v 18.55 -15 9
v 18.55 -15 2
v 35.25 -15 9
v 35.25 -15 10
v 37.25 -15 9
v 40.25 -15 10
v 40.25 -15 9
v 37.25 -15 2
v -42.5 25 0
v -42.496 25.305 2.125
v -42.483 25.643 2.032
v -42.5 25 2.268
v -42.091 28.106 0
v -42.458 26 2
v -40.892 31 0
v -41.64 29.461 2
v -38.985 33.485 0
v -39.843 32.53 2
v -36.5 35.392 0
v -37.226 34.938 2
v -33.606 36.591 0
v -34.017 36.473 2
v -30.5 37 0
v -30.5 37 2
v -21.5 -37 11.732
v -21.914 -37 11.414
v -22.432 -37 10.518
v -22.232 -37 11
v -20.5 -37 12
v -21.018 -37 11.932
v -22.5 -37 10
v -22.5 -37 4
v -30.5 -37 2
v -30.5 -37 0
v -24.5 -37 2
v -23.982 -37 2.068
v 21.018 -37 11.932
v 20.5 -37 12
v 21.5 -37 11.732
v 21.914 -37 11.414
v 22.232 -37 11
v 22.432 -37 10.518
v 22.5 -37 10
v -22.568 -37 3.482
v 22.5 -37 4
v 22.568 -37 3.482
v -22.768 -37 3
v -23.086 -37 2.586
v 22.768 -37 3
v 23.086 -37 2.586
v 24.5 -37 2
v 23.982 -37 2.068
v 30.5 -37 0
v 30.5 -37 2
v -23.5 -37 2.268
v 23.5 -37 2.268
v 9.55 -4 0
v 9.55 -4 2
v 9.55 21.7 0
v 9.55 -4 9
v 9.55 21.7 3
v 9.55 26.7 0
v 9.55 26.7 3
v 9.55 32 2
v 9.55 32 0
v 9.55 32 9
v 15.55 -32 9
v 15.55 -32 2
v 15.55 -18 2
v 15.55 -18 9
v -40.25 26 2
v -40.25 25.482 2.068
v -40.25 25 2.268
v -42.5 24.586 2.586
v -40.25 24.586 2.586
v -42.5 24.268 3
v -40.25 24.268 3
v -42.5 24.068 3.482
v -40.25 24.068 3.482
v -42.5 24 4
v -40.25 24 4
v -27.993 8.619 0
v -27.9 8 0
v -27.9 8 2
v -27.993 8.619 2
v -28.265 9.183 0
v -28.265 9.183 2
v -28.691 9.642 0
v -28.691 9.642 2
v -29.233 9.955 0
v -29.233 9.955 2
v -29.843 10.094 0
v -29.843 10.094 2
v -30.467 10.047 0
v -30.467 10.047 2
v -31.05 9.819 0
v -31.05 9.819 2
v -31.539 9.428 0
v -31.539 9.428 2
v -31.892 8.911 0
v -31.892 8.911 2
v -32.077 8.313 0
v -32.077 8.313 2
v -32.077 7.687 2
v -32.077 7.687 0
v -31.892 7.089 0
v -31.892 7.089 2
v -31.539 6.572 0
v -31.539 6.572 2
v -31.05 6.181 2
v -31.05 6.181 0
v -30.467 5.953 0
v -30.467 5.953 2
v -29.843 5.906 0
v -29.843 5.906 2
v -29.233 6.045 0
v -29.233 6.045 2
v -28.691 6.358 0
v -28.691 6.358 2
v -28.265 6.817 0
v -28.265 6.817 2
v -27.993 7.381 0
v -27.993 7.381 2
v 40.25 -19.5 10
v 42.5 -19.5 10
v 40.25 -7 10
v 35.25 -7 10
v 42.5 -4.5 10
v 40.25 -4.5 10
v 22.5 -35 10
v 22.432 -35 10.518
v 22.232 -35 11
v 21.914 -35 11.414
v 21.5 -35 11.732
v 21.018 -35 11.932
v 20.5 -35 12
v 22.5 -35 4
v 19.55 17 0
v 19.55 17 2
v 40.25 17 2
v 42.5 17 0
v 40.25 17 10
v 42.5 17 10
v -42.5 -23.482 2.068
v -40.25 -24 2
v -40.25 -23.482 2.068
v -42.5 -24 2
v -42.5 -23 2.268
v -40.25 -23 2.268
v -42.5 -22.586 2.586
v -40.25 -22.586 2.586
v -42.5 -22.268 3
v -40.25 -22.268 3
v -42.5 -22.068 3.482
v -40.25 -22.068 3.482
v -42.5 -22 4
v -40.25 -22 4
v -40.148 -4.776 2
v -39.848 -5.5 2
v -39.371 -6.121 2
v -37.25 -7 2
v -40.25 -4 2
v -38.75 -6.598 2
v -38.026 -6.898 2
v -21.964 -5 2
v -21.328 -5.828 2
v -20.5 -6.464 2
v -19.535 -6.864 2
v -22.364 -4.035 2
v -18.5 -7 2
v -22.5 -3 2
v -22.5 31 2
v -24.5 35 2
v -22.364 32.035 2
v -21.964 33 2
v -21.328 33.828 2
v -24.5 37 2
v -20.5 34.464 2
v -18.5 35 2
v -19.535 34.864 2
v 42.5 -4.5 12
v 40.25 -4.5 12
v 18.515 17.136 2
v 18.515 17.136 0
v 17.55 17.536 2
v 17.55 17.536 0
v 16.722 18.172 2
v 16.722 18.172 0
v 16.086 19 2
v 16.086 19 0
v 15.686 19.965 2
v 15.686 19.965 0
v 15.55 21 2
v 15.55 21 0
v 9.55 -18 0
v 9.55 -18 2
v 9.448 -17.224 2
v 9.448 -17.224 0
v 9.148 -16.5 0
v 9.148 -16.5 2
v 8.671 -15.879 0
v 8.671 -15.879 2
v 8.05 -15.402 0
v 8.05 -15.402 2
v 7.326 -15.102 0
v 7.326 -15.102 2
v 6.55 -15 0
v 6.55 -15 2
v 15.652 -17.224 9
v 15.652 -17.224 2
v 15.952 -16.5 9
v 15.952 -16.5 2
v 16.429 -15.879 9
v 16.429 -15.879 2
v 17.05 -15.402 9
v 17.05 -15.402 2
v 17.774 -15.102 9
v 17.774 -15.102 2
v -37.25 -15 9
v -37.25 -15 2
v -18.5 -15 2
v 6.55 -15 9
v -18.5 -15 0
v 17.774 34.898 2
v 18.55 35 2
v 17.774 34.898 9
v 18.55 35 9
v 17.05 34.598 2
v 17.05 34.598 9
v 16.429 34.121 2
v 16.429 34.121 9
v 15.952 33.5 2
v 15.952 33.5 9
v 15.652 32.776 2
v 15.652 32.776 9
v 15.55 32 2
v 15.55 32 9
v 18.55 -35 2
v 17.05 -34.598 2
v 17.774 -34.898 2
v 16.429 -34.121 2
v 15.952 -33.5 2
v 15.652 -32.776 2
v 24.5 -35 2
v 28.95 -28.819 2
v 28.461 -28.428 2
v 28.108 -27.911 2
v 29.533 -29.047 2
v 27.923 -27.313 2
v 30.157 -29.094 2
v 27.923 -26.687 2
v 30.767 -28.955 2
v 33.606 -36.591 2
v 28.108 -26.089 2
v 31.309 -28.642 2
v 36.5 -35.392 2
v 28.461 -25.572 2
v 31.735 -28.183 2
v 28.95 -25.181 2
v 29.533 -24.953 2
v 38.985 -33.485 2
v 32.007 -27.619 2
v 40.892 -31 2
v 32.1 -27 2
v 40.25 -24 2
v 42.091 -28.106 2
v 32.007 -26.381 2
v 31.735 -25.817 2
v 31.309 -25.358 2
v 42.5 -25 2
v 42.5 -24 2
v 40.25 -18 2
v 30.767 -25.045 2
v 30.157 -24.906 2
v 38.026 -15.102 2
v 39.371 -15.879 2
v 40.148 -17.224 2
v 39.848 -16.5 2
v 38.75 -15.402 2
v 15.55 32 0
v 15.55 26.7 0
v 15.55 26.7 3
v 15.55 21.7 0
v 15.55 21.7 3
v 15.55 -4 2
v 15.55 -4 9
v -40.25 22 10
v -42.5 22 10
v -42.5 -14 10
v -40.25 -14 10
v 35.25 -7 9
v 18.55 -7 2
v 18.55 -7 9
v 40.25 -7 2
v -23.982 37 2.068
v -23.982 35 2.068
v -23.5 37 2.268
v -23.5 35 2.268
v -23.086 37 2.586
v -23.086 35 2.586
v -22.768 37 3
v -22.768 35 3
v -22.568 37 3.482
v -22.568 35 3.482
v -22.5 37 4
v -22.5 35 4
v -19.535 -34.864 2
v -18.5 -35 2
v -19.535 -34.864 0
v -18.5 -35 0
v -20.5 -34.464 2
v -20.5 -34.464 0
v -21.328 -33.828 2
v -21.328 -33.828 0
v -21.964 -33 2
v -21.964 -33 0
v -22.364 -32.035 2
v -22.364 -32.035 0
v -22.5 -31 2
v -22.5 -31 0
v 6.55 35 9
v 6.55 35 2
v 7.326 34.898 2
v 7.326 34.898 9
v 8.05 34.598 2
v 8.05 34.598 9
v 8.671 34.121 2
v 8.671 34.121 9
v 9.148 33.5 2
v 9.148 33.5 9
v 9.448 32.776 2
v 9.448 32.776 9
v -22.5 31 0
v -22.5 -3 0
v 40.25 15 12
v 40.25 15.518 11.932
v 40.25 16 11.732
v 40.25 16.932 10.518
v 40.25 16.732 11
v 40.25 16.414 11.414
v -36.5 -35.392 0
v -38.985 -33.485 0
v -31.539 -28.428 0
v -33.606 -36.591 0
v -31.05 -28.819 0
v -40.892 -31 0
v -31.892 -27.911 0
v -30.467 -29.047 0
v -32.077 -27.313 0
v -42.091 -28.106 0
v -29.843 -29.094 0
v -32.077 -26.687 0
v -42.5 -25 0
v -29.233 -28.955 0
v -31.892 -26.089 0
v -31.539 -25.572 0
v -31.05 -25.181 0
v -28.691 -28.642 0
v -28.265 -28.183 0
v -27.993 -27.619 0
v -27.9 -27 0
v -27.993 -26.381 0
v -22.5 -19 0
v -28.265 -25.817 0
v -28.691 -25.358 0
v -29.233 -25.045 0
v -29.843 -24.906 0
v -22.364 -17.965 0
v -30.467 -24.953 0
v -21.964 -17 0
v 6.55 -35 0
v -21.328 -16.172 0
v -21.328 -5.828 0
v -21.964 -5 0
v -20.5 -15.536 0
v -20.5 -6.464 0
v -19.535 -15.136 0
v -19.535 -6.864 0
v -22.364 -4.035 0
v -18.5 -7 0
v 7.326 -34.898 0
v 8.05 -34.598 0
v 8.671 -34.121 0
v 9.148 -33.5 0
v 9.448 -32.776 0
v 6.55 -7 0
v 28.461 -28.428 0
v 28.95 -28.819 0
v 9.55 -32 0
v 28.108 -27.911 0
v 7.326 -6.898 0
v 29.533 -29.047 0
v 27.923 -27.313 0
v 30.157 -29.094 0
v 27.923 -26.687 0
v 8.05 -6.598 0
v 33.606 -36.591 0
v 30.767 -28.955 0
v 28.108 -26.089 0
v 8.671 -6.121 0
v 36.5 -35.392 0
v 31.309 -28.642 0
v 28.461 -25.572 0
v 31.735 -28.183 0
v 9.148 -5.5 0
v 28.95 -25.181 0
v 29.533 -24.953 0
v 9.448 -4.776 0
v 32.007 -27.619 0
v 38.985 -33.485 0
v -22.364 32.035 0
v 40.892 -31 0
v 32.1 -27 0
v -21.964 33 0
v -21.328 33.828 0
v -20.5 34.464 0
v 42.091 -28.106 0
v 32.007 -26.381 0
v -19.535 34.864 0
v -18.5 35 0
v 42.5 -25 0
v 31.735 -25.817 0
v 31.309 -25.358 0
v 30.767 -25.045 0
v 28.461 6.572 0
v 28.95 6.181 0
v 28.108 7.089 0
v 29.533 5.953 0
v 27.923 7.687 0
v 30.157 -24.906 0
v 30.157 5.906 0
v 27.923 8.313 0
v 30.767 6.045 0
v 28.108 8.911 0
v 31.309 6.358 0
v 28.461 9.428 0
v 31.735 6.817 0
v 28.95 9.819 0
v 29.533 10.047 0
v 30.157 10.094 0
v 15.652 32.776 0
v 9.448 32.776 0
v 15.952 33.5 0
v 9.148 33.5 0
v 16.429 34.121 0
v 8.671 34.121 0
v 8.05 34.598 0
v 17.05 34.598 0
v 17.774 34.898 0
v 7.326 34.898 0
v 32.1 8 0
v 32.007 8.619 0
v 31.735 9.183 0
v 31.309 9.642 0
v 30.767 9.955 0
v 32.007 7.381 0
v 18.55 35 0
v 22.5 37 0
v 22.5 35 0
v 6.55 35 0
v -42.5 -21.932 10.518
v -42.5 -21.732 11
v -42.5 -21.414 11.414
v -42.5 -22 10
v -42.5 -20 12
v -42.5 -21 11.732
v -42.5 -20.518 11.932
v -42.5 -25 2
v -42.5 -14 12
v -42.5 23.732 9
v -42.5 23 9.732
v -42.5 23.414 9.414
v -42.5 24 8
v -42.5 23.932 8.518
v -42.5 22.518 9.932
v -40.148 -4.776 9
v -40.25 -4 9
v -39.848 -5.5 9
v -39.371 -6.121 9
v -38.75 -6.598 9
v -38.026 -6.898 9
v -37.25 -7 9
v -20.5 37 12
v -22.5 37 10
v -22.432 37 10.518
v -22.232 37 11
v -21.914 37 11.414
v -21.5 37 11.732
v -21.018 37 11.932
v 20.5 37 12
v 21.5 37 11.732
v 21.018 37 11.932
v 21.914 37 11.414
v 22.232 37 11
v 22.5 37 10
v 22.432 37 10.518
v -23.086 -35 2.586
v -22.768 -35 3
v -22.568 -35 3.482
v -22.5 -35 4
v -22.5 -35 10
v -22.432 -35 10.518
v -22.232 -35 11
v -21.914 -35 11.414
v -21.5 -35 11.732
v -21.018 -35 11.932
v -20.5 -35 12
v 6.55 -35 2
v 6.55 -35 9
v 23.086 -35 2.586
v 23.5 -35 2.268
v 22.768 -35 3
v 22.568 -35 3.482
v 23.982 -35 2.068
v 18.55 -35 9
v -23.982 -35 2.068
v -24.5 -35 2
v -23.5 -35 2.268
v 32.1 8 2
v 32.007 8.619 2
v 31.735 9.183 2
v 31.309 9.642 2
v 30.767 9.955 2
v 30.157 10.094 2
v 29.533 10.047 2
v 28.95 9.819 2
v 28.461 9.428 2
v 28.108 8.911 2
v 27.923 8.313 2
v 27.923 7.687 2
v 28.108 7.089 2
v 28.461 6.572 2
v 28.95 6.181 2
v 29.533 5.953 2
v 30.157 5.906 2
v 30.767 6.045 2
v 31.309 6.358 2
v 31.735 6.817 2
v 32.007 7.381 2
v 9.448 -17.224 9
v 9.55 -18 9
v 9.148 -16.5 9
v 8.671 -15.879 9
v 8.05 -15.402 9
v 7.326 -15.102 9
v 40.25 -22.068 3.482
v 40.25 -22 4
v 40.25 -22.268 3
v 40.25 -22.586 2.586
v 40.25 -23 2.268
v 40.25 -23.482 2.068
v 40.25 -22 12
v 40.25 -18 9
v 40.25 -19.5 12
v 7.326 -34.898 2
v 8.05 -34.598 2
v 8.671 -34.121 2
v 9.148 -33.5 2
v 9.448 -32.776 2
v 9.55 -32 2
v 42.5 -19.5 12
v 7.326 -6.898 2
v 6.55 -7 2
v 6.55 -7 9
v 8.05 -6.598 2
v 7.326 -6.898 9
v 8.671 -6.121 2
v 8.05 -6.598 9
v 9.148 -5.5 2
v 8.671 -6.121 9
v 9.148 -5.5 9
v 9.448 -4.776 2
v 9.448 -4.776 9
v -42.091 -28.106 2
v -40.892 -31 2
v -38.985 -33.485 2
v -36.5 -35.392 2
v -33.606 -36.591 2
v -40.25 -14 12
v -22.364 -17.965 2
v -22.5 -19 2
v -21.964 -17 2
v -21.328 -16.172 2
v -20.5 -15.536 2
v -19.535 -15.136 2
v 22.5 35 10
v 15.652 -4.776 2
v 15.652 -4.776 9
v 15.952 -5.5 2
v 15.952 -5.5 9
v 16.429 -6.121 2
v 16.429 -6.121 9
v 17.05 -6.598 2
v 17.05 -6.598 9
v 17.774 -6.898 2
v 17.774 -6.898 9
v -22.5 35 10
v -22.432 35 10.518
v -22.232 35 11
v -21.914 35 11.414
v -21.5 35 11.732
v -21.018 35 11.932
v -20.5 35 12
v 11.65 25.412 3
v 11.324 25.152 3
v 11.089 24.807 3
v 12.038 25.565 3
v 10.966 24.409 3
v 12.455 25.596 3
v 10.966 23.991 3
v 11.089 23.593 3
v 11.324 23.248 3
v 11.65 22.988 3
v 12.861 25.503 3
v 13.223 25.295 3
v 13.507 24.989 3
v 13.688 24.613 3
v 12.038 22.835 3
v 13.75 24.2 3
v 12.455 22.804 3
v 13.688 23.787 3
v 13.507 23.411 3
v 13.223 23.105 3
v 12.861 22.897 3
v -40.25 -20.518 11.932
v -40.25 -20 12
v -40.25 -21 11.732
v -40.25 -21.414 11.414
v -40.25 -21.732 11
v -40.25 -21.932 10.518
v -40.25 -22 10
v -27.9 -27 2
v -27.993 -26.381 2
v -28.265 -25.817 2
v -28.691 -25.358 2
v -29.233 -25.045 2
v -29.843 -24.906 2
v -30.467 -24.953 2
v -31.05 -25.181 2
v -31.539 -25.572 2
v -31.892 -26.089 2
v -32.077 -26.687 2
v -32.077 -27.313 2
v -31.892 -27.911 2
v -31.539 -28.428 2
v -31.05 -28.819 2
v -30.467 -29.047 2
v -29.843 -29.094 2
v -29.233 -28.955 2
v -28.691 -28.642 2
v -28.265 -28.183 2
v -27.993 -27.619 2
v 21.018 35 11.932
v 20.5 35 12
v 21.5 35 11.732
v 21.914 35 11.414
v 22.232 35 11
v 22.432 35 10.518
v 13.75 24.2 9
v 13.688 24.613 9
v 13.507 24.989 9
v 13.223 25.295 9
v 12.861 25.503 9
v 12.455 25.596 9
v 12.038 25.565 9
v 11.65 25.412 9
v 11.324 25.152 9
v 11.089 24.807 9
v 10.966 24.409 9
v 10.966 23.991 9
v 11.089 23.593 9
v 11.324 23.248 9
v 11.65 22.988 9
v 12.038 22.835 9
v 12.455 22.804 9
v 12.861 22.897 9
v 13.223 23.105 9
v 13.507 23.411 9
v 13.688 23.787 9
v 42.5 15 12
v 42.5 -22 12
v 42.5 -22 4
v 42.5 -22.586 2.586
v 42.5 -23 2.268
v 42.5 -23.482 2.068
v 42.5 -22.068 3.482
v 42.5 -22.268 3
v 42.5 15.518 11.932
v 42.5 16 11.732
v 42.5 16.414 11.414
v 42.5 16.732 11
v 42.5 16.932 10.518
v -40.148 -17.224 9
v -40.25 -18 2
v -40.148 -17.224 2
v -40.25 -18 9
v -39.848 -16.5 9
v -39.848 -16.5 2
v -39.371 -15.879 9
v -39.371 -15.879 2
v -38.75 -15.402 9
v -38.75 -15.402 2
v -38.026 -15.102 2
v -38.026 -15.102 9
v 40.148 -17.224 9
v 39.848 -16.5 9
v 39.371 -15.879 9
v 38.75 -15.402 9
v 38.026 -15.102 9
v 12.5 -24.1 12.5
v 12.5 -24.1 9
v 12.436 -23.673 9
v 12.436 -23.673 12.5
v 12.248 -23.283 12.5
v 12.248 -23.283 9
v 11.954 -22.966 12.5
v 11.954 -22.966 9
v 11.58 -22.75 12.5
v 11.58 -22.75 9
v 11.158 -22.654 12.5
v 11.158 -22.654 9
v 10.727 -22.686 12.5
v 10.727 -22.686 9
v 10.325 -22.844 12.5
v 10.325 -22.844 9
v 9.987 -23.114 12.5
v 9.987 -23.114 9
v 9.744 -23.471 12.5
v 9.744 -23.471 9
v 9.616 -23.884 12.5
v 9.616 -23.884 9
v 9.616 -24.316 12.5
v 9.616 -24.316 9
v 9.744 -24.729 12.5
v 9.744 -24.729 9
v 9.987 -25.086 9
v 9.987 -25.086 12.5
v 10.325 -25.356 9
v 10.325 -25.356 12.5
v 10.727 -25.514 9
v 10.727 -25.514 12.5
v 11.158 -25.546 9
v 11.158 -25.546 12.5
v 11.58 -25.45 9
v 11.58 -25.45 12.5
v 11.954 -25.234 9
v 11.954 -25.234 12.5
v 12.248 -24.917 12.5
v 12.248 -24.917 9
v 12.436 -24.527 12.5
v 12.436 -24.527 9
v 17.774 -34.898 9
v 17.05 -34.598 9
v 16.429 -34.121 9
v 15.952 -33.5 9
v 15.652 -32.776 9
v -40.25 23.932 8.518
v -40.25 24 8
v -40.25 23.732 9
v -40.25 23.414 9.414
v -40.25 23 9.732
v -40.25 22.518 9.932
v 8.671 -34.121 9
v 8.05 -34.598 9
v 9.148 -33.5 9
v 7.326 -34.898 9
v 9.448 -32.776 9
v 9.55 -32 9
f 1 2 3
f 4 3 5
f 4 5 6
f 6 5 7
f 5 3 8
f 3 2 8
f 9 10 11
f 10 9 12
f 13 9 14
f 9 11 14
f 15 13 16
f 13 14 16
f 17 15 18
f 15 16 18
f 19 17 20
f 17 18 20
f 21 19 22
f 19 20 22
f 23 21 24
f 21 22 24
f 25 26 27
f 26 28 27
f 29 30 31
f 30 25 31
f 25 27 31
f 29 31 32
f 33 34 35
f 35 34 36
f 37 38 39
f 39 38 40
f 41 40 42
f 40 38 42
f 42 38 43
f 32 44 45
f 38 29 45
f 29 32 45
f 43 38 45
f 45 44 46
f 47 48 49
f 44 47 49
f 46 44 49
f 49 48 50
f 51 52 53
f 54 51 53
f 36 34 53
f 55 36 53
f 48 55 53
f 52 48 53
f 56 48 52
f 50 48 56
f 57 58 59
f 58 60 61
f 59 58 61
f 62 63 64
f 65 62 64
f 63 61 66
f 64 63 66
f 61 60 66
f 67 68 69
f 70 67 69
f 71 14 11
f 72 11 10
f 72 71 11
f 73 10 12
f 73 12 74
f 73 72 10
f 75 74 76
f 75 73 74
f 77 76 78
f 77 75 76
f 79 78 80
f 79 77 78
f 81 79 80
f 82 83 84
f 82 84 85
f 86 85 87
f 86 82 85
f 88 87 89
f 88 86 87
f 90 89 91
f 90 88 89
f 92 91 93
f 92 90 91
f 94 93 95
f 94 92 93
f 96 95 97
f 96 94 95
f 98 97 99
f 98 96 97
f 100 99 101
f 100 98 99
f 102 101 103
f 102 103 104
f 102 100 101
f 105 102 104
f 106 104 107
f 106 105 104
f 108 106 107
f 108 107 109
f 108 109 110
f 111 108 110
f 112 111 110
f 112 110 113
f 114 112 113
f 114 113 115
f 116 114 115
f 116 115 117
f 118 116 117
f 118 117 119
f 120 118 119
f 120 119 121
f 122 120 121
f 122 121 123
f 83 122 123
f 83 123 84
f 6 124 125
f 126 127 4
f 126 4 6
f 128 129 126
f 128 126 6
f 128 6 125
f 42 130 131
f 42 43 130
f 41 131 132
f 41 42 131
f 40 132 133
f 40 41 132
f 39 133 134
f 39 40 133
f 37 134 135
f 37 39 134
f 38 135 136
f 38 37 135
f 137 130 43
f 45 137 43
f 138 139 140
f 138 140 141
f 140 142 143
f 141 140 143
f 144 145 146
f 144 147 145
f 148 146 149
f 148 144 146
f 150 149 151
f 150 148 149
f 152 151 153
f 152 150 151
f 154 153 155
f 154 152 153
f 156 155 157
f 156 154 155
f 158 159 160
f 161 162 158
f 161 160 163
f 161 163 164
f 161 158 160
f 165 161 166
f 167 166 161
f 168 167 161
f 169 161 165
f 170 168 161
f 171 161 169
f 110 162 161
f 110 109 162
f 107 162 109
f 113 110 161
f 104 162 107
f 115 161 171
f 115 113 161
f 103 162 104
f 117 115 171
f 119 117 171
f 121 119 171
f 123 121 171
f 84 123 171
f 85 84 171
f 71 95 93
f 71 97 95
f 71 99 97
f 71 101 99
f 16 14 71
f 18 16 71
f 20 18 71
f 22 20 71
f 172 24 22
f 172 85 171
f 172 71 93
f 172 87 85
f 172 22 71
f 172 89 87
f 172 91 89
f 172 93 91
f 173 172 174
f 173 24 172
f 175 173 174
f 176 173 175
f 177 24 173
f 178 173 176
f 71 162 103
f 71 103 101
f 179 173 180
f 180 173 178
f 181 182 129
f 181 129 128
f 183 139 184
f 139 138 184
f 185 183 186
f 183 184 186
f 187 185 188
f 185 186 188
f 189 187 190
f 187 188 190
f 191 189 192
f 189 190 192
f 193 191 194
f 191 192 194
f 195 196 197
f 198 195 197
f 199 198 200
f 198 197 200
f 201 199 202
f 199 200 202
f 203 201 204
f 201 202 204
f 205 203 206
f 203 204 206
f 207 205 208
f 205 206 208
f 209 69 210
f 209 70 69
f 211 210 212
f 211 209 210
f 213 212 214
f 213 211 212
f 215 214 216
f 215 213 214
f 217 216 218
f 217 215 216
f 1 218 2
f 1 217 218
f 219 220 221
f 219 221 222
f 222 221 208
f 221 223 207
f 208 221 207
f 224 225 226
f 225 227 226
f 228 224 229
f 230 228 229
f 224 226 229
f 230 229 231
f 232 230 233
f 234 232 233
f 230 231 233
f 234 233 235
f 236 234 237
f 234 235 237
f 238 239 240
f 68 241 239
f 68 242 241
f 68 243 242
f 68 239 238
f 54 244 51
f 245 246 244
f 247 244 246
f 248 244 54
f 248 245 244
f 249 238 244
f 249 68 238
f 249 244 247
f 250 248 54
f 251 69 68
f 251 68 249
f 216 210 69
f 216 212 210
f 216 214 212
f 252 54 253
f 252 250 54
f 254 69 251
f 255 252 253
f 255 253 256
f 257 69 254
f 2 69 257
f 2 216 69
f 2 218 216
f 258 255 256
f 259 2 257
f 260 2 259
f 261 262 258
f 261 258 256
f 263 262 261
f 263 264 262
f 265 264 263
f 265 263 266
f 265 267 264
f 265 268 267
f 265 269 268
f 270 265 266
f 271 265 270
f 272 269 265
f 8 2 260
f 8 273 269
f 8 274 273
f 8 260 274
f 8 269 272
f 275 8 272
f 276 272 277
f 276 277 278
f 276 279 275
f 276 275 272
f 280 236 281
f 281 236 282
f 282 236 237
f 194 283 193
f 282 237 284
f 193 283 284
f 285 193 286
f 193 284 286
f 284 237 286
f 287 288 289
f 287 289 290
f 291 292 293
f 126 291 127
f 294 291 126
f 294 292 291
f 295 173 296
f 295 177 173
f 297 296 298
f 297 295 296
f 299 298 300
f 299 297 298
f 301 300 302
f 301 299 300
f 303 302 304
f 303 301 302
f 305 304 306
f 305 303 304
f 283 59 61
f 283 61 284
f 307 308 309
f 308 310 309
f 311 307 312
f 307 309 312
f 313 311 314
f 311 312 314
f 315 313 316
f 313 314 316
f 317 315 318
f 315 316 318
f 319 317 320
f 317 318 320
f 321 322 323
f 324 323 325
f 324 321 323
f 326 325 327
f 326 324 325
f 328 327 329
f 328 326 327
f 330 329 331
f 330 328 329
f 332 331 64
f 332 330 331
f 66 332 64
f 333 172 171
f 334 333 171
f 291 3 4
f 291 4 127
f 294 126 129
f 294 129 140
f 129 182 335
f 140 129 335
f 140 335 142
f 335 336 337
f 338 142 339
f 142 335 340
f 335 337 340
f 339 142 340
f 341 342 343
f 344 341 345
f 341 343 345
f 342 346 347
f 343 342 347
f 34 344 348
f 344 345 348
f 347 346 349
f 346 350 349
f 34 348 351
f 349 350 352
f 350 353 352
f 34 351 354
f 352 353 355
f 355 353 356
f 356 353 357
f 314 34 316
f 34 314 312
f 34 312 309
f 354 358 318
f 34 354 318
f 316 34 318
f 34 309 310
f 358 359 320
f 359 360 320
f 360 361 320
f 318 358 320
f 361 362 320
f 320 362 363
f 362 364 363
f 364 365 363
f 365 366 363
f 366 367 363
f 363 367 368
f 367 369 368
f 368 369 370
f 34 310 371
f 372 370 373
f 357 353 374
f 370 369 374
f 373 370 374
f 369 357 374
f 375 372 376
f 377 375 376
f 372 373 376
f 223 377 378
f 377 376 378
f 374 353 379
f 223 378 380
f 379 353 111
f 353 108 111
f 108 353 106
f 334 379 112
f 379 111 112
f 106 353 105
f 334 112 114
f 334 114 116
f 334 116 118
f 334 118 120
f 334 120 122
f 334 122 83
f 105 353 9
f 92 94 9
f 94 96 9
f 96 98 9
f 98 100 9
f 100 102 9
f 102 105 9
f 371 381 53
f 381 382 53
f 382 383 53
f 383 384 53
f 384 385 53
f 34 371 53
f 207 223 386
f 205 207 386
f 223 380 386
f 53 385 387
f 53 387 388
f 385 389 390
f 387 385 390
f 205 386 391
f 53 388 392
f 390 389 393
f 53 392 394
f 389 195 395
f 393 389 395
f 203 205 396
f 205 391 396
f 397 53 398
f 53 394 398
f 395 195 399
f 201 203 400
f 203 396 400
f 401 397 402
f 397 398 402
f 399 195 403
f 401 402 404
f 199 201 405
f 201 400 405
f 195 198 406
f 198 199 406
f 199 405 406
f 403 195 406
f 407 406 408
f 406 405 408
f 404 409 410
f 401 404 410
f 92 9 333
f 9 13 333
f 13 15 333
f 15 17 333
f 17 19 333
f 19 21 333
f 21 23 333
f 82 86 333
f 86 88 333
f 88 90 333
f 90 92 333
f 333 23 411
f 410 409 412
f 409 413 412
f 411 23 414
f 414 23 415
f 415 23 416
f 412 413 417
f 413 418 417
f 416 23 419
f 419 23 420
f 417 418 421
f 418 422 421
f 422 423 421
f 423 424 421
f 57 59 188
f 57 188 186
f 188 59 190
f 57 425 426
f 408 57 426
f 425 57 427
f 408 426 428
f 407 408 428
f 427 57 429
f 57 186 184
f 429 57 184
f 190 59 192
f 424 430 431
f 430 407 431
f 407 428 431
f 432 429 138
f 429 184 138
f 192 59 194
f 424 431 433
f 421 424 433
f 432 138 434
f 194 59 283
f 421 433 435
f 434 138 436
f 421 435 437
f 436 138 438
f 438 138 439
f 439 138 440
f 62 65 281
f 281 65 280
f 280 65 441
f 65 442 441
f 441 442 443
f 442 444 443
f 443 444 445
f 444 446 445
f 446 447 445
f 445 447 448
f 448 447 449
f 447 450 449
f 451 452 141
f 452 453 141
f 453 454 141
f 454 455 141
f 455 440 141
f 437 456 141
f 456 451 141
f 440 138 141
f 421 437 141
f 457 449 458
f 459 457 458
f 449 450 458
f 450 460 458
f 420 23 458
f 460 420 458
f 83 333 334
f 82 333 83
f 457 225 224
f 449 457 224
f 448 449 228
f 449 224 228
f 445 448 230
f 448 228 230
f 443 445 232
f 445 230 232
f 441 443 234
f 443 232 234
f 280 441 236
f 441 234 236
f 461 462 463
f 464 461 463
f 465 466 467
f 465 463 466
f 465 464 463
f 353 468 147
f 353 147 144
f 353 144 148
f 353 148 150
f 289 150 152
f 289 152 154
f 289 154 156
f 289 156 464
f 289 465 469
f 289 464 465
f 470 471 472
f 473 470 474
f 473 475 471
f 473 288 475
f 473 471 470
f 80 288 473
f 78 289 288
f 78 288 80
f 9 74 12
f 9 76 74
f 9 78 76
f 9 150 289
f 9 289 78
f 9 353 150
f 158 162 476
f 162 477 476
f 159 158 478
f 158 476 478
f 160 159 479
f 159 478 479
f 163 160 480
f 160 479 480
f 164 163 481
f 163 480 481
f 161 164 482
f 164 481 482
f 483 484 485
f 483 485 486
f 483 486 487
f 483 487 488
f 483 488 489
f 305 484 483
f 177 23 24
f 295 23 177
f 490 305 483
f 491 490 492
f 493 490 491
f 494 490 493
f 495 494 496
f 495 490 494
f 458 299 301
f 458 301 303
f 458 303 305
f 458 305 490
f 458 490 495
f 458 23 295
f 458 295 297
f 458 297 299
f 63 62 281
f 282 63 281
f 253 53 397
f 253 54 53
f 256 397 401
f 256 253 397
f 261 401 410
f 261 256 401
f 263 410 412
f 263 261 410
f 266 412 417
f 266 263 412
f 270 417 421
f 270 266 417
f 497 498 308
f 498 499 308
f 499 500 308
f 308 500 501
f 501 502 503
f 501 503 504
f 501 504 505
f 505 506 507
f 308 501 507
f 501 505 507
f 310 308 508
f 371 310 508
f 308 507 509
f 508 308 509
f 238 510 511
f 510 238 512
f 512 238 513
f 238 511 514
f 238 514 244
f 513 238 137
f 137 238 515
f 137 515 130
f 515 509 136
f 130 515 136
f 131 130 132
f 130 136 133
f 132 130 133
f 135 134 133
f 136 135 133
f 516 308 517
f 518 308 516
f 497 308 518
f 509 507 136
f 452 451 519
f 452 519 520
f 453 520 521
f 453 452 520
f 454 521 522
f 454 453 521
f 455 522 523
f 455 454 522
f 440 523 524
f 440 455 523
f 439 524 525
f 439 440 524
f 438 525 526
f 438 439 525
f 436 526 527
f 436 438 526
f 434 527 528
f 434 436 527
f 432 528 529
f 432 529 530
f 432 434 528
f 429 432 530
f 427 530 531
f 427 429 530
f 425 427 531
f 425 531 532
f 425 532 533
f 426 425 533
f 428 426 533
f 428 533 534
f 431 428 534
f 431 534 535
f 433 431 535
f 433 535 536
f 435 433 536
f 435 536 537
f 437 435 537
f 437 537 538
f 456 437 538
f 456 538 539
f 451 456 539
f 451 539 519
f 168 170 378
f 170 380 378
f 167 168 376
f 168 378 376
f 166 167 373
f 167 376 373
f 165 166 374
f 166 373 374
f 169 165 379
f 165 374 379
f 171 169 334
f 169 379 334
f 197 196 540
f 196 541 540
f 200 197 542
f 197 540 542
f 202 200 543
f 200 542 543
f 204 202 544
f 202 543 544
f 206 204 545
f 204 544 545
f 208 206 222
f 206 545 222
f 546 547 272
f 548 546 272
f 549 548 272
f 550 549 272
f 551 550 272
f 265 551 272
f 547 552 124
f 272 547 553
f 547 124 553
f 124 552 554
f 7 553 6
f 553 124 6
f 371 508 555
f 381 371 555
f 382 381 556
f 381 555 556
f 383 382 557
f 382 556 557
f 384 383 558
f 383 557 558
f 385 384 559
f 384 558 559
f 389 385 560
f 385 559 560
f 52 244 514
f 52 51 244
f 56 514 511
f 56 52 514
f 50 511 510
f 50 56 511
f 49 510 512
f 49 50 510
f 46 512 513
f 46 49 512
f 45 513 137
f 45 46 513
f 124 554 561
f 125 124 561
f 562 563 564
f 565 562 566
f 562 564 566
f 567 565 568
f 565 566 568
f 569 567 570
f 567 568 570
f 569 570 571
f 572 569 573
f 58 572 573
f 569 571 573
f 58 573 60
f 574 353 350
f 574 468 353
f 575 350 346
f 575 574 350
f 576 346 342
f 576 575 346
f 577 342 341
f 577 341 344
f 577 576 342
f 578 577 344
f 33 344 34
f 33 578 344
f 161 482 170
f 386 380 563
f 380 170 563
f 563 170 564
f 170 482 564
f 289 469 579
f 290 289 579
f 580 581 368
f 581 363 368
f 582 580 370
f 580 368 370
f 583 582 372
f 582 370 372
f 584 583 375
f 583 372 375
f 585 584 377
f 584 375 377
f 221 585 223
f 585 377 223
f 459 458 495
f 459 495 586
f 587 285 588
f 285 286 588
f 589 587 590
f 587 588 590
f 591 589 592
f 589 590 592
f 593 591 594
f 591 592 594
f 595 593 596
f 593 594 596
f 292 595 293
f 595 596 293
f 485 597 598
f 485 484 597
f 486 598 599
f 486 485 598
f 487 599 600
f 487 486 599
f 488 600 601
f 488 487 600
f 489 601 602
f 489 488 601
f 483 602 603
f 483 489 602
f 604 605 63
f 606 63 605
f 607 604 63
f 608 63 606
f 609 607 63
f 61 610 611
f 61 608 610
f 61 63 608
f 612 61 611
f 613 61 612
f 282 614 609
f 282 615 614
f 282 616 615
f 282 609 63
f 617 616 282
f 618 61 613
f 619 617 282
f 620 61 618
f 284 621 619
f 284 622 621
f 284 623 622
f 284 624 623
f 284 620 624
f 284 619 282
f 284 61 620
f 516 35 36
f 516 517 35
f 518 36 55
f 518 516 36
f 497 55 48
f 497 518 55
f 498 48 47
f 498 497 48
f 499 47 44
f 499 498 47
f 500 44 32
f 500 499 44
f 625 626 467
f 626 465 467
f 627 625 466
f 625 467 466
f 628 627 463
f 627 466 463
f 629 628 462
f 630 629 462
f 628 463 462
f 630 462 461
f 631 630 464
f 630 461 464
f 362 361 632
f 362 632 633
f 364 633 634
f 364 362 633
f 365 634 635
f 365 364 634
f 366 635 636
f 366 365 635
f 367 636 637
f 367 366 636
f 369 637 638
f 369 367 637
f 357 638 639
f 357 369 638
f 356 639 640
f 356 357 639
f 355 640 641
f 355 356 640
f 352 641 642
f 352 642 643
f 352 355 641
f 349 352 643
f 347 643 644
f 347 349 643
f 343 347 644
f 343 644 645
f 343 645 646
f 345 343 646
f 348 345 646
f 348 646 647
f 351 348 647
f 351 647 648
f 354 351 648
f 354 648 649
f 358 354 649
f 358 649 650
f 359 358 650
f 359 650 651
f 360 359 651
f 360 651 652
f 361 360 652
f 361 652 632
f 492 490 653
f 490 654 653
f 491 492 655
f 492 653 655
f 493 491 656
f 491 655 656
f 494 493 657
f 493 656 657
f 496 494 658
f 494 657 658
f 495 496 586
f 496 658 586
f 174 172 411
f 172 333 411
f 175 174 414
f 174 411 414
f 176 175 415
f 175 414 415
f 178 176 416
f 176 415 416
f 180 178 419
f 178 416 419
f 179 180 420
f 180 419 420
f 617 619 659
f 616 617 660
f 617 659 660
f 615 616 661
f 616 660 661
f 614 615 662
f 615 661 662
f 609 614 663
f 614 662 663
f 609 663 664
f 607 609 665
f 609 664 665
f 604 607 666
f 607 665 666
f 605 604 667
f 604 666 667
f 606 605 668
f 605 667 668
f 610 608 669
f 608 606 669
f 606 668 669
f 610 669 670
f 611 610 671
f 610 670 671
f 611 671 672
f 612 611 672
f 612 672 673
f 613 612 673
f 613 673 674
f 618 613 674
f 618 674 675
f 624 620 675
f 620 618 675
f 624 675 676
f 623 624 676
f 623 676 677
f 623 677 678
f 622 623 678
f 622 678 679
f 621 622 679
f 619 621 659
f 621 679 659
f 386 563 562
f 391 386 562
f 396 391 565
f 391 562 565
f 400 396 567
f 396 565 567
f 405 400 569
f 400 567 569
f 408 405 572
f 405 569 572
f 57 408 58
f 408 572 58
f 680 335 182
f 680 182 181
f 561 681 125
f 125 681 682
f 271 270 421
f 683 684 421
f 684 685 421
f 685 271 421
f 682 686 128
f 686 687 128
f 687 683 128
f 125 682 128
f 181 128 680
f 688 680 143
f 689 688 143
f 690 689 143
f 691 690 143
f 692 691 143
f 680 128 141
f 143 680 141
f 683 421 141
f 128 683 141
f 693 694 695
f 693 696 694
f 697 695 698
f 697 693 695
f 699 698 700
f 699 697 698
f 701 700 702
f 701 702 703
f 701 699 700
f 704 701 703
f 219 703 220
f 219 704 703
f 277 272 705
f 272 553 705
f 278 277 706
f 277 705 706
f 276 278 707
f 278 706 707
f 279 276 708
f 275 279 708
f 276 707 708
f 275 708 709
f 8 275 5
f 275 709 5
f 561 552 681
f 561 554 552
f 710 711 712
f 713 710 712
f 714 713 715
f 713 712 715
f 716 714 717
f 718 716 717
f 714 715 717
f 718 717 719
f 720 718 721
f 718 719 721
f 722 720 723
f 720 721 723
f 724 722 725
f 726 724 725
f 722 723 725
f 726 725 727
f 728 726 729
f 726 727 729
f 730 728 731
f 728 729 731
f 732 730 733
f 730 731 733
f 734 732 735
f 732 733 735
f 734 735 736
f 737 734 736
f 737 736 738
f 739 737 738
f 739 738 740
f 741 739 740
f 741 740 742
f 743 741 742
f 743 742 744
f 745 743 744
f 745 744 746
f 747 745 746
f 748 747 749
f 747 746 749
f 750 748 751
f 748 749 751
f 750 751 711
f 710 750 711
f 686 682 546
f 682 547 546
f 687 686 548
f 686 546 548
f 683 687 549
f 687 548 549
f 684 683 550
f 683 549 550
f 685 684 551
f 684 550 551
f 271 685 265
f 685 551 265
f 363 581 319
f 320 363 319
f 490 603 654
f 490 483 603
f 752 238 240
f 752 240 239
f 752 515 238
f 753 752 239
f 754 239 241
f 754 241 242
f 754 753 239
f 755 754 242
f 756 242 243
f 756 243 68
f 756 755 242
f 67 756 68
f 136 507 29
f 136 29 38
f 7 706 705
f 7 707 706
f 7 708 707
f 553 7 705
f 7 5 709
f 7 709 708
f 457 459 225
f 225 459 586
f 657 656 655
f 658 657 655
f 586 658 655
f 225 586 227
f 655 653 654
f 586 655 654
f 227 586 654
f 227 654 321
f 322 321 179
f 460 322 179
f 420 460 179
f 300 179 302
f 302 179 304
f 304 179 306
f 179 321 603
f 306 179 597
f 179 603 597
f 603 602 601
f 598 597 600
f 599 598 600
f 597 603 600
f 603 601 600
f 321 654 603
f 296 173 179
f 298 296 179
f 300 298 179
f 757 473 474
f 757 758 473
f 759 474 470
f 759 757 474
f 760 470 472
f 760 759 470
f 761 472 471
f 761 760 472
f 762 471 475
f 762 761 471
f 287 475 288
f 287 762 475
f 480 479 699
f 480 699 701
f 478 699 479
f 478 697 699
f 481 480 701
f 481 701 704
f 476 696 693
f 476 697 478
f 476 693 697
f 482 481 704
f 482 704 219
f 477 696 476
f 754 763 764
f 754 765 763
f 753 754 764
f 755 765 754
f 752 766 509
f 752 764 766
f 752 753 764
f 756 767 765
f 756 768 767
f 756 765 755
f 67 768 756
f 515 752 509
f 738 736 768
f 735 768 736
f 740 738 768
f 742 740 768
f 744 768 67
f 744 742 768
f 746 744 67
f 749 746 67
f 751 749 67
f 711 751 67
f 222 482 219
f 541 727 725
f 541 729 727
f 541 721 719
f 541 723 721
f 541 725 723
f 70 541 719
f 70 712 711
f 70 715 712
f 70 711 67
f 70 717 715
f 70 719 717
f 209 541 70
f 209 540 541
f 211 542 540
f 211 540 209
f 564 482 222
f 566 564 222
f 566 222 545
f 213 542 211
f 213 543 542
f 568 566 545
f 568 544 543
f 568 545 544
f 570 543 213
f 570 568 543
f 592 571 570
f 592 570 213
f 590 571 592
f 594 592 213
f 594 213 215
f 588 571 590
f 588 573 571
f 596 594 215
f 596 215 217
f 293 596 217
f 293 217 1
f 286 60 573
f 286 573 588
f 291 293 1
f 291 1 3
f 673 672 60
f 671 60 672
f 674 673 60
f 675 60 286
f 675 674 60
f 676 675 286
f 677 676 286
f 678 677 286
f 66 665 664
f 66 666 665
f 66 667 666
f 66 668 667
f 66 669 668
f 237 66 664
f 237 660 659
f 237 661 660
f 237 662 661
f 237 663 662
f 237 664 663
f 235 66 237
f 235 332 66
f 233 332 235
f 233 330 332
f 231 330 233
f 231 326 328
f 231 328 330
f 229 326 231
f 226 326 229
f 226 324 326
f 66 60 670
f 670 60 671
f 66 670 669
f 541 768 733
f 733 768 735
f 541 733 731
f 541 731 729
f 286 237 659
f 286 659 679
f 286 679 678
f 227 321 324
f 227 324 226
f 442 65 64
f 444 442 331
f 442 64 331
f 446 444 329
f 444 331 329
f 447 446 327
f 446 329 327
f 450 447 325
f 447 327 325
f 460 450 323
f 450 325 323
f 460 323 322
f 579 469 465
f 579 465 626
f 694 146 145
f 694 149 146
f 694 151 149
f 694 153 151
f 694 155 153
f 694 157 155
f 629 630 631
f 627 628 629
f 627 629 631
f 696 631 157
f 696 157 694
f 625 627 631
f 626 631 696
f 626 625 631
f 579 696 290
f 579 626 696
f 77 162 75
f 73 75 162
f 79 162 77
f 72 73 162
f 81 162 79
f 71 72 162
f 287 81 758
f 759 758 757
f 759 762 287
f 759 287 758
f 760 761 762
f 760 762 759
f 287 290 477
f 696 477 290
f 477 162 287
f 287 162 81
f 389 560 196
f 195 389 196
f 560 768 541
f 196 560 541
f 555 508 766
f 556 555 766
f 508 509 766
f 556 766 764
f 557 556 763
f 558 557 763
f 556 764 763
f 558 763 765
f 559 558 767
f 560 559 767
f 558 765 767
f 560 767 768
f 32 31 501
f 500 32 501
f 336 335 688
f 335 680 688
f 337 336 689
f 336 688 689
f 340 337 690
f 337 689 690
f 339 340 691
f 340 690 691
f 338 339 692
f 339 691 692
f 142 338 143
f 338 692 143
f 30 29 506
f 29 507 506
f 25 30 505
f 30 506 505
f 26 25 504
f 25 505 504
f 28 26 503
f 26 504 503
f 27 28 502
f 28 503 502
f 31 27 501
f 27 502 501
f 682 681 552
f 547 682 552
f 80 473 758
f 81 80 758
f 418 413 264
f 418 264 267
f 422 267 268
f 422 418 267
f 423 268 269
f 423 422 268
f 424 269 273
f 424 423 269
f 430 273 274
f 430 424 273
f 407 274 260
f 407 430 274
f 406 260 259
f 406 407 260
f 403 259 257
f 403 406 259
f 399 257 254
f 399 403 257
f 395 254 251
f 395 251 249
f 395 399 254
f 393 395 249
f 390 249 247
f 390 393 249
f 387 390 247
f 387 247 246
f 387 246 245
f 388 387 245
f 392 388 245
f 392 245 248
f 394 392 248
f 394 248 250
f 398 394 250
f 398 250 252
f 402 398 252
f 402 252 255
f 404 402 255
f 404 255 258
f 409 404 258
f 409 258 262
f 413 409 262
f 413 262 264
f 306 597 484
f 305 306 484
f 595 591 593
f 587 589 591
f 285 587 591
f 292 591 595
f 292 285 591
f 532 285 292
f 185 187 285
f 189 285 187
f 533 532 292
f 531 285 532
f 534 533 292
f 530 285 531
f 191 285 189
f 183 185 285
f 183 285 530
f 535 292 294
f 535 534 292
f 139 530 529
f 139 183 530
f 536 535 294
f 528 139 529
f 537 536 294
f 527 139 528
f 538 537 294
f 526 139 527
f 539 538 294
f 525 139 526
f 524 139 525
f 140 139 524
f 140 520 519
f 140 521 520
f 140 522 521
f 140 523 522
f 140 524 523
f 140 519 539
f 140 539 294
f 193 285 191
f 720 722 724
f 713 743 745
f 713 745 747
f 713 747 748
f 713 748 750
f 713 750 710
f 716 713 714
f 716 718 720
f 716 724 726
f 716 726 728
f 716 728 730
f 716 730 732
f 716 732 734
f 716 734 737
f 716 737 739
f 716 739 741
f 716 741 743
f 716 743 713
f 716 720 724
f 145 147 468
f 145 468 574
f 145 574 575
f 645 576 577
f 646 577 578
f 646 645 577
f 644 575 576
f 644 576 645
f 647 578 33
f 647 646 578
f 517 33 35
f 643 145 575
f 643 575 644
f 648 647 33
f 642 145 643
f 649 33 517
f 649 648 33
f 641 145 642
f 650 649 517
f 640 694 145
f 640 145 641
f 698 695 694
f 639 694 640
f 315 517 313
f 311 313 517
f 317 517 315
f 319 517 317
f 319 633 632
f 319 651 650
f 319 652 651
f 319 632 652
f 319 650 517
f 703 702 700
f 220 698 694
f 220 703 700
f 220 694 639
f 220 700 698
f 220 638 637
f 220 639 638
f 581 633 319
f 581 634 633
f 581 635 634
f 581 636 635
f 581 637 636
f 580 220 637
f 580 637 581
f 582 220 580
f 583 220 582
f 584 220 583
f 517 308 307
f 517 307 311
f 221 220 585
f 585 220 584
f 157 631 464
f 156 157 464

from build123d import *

# Parameters (mm, degrees)
F0_W      = 85
F0_H      = 74
F0_R      = 2.1
F1_DEPTH  = 12
F2_W      = 80.5
F2_H      = 70
F2_R      = 2.1
F3_DEPTH  = 10
F4_W      = 6
F4_H      = 42
F4_W_2    = 49.8
F4_H_2    = 8
F4_W_3    = 24.7
F4_H_3    = 20
F5_DEPTH  = 7
F6_R      = 1.45
F7_DEPTH  = 3.5
F8_W      = 2.25
F8_H      = 38
F9_DEPTH  = 2
F11_DEPTH = 10
F12_W     = 2.25
F12_H     = 15
F13_DEPTH = 2
F14_R     = 12
F15_R     = 3
F17_DEPTH = 2
F19_DEPTH = 2
F21_DEPTH = 2
F22_R     = 4
F23_R     = 2
F6_R_2    = 1.4
F24_DEPTH = 9
F25_W     = 6
F25_H     = 5
F25_R     = 1.4
F26_DEPTH = 3
F27_W     = 5
F27_H     = 8
F28_DEPTH = 1


with BuildPart() as f1:
    # F0 (on Top) → F1 (new body)
    with BuildSketch(Plane.XY):
        Rectangle(F0_W, F0_H)
        with Locations((-30, -27)):
            Circle(F0_R, mode=Mode.SUBTRACT)
        with Locations((30, -27)):
            Circle(F0_R, mode=Mode.SUBTRACT)
        with Locations((-30, 8)):
            Circle(F0_R, mode=Mode.SUBTRACT)
        with Locations((30, 8)):
            Circle(F0_R, mode=Mode.SUBTRACT)
    extrude(amount=F1_DEPTH)

    # F2 (on face) → F3 (cut)
    with BuildSketch(Plane.XY.offset(12)):
        Rectangle(F2_W, F2_H)
        with Locations((-30, -27)):
            Circle(F2_R, mode=Mode.SUBTRACT)
        with Locations((30, -27)):
            Circle(F2_R, mode=Mode.SUBTRACT)
        with Locations((-30, 8)):
            Circle(F2_R, mode=Mode.SUBTRACT)
        with Locations((30, 8)):
            Circle(F2_R, mode=Mode.SUBTRACT)
    extrude(amount=-F3_DEPTH, mode=Mode.SUBTRACT)

    # F4 (on face) → F5 (join)
    with BuildSketch(Plane.XY.offset(2)):
        with Locations((12.55, 14)):
            Rectangle(F4_W, F4_H)
        with Locations((-15.35, -11)):
            Rectangle(F4_W_2, F4_H_2)
        with Locations((12.55, -11)):
            Rectangle(F4_W, F4_H_2)
        with Locations((27.9, -11)):
            Rectangle(F4_W_3, F4_H_2)
        with Locations((12.55, -25)):
            Rectangle(F4_W, F4_H_3)
    extrude(amount=F5_DEPTH)

    # F6 (on face) → F7 (join)
    with BuildSketch(Plane.XY.offset(9)):
        with Locations((11.05, -24.1)):
            Circle(F6_R)
    extrude(amount=F7_DEPTH)

    # F8 (on face) → F9 (cut)
    with BuildSketch(Plane.XY.offset(12)):
        with Locations((-41.375, 5)):
            Rectangle(F8_W, F8_H)
    extrude(amount=-F9_DEPTH, mode=Mode.SUBTRACT)

    # F10 (on face) → F11 (cut, through all)
    with BuildSketch(Plane.XY.offset(12)):
        Polygon((-42.5, 37), (-42.5, 24), (-40.25, 24), (-40.25, 35), (-22.5, 35), (-22.5, 37), align=None)
        Polygon((42.5, 37), (22.5, 37), (22.5, 35), (40.25, 35), (40.25, 17), (42.5, 17), align=None)
        Polygon((42.5, -37), (42.5, -22), (40.25, -22), (40.25, -35), (22.5, -35), (22.5, -37), align=None)
        Polygon((-42.5, -37), (-22.5, -37), (-22.5, -35), (-40.25, -35), (-40.25, -22), (-42.5, -22), align=None)
    extrude(amount=-F11_DEPTH, mode=Mode.SUBTRACT)

    # F12 (on face) → F13 (cut)
    with BuildSketch(Plane.XY.offset(12)):
        with Locations((41.375, -12)):
            Rectangle(F12_W, F12_H)
    extrude(amount=-F13_DEPTH, mode=Mode.SUBTRACT)

    # F14
    f14_edges = [f1.edges().sort_by_distance(p)[0] for p in [
        (-42.5, 37, 1),
        (-42.5, -37, 1),
        (42.5, -37, 1),
        (42.5, 37, 1),
    ]]
    fillet(f14_edges, radius=F14_R)

    # F15
    f15_edges = [f1.edges().sort_by_distance(p)[0] for p in [
        (9.55, -7, 5.5),
        (9.55, -15, 5.5),
        (15.55, -15, 5.5),
        (15.55, -7, 5.5),
        (-40.25, -7, 5.5),
        (-40.25, -15, 5.5),
        (9.55, 35, 5.5),
        (15.55, 35, 5.5),
        (9.55, -35, 5.5),
        (40.25, -15, 5.5),
        (15.55, -35, 5.5),
    ]]
    fillet(f15_edges, radius=F15_R)

    # F16 (on face) → F17 (cut, through all)
    with BuildSketch(Plane.XY.offset(2)):
        with BuildLine():
            ThreePointArc((9.55, -18), (8.6713203436, -15.8786796564), (6.55, -15))
            Line((6.55, -15), (-22.5, -15))
            Line((-22.5, -15), (-22.5, -35))
            Line((-22.5, -35), (6.55, -35))
            ThreePointArc((6.55, -35), (8.6713203436, -34.1213203436), (9.55, -32))
            Line((9.55, -32), (9.55, -18))
        make_face()
    extrude(amount=-F17_DEPTH, mode=Mode.SUBTRACT)

    # F18 (on face) → F19 (cut, through all)
    with BuildSketch(Plane.XY.offset(2)):
        with BuildLine():
            Line((-22.5, 35), (-22.5, -7))
            Line((-22.5, -7), (6.55, -7))
            ThreePointArc((6.55, -7), (8.6713203436, -6.1213203436), (9.55, -4))
            Line((9.55, -4), (9.55, 32))
            ThreePointArc((9.55, 32), (8.6713203436, 34.1213203436), (6.55, 35))
            Line((6.55, 35), (-22.5, 35))
        make_face()
    extrude(amount=-F19_DEPTH, mode=Mode.SUBTRACT)

    # F20 (on face) → F21 (cut, through all)
    with BuildSketch(Plane.XY.offset(2)):
        with BuildLine():
            ThreePointArc((18.55, 35), (16.4286796564, 34.1213203436), (15.55, 32))
            Line((15.55, 32), (15.55, 17))
            Line((15.55, 17), (40.25, 17))
            Line((40.25, 17), (42.5, 17))
            Line((42.5, 17), (42.5, 25))
            ThreePointArc((42.5, 25), (38.9852813742, 33.4852813742), (30.5, 37))
            Line((30.5, 37), (22.5, 37))
            Line((22.5, 37), (22.5, 35))
            Line((22.5, 35), (18.55, 35))
        make_face()
    extrude(amount=-F21_DEPTH, mode=Mode.SUBTRACT)

    # F22
    f22_edges = [f1.edges().sort_by_distance(p)[0] for p in [
        (-22.5, 35, 1),
        (-22.5, -7, 1),
        (15.55, 17, 1),
        (-22.5, -15, 1),
        (-22.5, -35, 1),
    ]]
    fillet(f22_edges, radius=F22_R)

    # F23
    f23_edges = [f1.edges().sort_by_distance(p)[0] for p in [
        (-22.5, -36, 12),
        (22.5, -36, 12),
        (-41.375, -22, 12),
        (-22.5, 36, 12),
        (-22.5, 36, 2),
        (22.5, 36, 12),
        (41.375, 17, 12),
        (-41.375, 24, 10),
        (-22.5, -36, 2),
        (22.5, -36, 2),
        (41.375, -22, 2),
        (-41.375, -22, 2),
        (-41.375, 24, 2),
    ]]
    fillet(f23_edges, radius=F23_R)

    # F6 (on face) → F24 (cut, through all)
    with BuildSketch(Plane.XY.offset(9)):
        with Locations((12.35, 24.2)):
            Circle(F6_R_2)
    extrude(amount=-F24_DEPTH, mode=Mode.SUBTRACT)

    # F25 (on face) → F26 (cut)
    with BuildSketch(Plane(origin=(0, 0, 0), x_dir=(1, 0, 0), z_dir=(0, 0, -1))):
        with Locations((12.55, -24.2)):
            Rectangle(F25_W, F25_H)
        with Locations((12.35, -24.2)):
            Circle(F25_R, mode=Mode.SUBTRACT)
    extrude(amount=-F26_DEPTH, mode=Mode.SUBTRACT)

    # F27 (on face) → F28 (join, through all)
    with BuildSketch(Plane.XY.offset(9)):
        with Locations((37.75, -11)):
            Rectangle(F27_W, F27_H)
    extrude(amount=F28_DEPTH)


solid = f1.part
